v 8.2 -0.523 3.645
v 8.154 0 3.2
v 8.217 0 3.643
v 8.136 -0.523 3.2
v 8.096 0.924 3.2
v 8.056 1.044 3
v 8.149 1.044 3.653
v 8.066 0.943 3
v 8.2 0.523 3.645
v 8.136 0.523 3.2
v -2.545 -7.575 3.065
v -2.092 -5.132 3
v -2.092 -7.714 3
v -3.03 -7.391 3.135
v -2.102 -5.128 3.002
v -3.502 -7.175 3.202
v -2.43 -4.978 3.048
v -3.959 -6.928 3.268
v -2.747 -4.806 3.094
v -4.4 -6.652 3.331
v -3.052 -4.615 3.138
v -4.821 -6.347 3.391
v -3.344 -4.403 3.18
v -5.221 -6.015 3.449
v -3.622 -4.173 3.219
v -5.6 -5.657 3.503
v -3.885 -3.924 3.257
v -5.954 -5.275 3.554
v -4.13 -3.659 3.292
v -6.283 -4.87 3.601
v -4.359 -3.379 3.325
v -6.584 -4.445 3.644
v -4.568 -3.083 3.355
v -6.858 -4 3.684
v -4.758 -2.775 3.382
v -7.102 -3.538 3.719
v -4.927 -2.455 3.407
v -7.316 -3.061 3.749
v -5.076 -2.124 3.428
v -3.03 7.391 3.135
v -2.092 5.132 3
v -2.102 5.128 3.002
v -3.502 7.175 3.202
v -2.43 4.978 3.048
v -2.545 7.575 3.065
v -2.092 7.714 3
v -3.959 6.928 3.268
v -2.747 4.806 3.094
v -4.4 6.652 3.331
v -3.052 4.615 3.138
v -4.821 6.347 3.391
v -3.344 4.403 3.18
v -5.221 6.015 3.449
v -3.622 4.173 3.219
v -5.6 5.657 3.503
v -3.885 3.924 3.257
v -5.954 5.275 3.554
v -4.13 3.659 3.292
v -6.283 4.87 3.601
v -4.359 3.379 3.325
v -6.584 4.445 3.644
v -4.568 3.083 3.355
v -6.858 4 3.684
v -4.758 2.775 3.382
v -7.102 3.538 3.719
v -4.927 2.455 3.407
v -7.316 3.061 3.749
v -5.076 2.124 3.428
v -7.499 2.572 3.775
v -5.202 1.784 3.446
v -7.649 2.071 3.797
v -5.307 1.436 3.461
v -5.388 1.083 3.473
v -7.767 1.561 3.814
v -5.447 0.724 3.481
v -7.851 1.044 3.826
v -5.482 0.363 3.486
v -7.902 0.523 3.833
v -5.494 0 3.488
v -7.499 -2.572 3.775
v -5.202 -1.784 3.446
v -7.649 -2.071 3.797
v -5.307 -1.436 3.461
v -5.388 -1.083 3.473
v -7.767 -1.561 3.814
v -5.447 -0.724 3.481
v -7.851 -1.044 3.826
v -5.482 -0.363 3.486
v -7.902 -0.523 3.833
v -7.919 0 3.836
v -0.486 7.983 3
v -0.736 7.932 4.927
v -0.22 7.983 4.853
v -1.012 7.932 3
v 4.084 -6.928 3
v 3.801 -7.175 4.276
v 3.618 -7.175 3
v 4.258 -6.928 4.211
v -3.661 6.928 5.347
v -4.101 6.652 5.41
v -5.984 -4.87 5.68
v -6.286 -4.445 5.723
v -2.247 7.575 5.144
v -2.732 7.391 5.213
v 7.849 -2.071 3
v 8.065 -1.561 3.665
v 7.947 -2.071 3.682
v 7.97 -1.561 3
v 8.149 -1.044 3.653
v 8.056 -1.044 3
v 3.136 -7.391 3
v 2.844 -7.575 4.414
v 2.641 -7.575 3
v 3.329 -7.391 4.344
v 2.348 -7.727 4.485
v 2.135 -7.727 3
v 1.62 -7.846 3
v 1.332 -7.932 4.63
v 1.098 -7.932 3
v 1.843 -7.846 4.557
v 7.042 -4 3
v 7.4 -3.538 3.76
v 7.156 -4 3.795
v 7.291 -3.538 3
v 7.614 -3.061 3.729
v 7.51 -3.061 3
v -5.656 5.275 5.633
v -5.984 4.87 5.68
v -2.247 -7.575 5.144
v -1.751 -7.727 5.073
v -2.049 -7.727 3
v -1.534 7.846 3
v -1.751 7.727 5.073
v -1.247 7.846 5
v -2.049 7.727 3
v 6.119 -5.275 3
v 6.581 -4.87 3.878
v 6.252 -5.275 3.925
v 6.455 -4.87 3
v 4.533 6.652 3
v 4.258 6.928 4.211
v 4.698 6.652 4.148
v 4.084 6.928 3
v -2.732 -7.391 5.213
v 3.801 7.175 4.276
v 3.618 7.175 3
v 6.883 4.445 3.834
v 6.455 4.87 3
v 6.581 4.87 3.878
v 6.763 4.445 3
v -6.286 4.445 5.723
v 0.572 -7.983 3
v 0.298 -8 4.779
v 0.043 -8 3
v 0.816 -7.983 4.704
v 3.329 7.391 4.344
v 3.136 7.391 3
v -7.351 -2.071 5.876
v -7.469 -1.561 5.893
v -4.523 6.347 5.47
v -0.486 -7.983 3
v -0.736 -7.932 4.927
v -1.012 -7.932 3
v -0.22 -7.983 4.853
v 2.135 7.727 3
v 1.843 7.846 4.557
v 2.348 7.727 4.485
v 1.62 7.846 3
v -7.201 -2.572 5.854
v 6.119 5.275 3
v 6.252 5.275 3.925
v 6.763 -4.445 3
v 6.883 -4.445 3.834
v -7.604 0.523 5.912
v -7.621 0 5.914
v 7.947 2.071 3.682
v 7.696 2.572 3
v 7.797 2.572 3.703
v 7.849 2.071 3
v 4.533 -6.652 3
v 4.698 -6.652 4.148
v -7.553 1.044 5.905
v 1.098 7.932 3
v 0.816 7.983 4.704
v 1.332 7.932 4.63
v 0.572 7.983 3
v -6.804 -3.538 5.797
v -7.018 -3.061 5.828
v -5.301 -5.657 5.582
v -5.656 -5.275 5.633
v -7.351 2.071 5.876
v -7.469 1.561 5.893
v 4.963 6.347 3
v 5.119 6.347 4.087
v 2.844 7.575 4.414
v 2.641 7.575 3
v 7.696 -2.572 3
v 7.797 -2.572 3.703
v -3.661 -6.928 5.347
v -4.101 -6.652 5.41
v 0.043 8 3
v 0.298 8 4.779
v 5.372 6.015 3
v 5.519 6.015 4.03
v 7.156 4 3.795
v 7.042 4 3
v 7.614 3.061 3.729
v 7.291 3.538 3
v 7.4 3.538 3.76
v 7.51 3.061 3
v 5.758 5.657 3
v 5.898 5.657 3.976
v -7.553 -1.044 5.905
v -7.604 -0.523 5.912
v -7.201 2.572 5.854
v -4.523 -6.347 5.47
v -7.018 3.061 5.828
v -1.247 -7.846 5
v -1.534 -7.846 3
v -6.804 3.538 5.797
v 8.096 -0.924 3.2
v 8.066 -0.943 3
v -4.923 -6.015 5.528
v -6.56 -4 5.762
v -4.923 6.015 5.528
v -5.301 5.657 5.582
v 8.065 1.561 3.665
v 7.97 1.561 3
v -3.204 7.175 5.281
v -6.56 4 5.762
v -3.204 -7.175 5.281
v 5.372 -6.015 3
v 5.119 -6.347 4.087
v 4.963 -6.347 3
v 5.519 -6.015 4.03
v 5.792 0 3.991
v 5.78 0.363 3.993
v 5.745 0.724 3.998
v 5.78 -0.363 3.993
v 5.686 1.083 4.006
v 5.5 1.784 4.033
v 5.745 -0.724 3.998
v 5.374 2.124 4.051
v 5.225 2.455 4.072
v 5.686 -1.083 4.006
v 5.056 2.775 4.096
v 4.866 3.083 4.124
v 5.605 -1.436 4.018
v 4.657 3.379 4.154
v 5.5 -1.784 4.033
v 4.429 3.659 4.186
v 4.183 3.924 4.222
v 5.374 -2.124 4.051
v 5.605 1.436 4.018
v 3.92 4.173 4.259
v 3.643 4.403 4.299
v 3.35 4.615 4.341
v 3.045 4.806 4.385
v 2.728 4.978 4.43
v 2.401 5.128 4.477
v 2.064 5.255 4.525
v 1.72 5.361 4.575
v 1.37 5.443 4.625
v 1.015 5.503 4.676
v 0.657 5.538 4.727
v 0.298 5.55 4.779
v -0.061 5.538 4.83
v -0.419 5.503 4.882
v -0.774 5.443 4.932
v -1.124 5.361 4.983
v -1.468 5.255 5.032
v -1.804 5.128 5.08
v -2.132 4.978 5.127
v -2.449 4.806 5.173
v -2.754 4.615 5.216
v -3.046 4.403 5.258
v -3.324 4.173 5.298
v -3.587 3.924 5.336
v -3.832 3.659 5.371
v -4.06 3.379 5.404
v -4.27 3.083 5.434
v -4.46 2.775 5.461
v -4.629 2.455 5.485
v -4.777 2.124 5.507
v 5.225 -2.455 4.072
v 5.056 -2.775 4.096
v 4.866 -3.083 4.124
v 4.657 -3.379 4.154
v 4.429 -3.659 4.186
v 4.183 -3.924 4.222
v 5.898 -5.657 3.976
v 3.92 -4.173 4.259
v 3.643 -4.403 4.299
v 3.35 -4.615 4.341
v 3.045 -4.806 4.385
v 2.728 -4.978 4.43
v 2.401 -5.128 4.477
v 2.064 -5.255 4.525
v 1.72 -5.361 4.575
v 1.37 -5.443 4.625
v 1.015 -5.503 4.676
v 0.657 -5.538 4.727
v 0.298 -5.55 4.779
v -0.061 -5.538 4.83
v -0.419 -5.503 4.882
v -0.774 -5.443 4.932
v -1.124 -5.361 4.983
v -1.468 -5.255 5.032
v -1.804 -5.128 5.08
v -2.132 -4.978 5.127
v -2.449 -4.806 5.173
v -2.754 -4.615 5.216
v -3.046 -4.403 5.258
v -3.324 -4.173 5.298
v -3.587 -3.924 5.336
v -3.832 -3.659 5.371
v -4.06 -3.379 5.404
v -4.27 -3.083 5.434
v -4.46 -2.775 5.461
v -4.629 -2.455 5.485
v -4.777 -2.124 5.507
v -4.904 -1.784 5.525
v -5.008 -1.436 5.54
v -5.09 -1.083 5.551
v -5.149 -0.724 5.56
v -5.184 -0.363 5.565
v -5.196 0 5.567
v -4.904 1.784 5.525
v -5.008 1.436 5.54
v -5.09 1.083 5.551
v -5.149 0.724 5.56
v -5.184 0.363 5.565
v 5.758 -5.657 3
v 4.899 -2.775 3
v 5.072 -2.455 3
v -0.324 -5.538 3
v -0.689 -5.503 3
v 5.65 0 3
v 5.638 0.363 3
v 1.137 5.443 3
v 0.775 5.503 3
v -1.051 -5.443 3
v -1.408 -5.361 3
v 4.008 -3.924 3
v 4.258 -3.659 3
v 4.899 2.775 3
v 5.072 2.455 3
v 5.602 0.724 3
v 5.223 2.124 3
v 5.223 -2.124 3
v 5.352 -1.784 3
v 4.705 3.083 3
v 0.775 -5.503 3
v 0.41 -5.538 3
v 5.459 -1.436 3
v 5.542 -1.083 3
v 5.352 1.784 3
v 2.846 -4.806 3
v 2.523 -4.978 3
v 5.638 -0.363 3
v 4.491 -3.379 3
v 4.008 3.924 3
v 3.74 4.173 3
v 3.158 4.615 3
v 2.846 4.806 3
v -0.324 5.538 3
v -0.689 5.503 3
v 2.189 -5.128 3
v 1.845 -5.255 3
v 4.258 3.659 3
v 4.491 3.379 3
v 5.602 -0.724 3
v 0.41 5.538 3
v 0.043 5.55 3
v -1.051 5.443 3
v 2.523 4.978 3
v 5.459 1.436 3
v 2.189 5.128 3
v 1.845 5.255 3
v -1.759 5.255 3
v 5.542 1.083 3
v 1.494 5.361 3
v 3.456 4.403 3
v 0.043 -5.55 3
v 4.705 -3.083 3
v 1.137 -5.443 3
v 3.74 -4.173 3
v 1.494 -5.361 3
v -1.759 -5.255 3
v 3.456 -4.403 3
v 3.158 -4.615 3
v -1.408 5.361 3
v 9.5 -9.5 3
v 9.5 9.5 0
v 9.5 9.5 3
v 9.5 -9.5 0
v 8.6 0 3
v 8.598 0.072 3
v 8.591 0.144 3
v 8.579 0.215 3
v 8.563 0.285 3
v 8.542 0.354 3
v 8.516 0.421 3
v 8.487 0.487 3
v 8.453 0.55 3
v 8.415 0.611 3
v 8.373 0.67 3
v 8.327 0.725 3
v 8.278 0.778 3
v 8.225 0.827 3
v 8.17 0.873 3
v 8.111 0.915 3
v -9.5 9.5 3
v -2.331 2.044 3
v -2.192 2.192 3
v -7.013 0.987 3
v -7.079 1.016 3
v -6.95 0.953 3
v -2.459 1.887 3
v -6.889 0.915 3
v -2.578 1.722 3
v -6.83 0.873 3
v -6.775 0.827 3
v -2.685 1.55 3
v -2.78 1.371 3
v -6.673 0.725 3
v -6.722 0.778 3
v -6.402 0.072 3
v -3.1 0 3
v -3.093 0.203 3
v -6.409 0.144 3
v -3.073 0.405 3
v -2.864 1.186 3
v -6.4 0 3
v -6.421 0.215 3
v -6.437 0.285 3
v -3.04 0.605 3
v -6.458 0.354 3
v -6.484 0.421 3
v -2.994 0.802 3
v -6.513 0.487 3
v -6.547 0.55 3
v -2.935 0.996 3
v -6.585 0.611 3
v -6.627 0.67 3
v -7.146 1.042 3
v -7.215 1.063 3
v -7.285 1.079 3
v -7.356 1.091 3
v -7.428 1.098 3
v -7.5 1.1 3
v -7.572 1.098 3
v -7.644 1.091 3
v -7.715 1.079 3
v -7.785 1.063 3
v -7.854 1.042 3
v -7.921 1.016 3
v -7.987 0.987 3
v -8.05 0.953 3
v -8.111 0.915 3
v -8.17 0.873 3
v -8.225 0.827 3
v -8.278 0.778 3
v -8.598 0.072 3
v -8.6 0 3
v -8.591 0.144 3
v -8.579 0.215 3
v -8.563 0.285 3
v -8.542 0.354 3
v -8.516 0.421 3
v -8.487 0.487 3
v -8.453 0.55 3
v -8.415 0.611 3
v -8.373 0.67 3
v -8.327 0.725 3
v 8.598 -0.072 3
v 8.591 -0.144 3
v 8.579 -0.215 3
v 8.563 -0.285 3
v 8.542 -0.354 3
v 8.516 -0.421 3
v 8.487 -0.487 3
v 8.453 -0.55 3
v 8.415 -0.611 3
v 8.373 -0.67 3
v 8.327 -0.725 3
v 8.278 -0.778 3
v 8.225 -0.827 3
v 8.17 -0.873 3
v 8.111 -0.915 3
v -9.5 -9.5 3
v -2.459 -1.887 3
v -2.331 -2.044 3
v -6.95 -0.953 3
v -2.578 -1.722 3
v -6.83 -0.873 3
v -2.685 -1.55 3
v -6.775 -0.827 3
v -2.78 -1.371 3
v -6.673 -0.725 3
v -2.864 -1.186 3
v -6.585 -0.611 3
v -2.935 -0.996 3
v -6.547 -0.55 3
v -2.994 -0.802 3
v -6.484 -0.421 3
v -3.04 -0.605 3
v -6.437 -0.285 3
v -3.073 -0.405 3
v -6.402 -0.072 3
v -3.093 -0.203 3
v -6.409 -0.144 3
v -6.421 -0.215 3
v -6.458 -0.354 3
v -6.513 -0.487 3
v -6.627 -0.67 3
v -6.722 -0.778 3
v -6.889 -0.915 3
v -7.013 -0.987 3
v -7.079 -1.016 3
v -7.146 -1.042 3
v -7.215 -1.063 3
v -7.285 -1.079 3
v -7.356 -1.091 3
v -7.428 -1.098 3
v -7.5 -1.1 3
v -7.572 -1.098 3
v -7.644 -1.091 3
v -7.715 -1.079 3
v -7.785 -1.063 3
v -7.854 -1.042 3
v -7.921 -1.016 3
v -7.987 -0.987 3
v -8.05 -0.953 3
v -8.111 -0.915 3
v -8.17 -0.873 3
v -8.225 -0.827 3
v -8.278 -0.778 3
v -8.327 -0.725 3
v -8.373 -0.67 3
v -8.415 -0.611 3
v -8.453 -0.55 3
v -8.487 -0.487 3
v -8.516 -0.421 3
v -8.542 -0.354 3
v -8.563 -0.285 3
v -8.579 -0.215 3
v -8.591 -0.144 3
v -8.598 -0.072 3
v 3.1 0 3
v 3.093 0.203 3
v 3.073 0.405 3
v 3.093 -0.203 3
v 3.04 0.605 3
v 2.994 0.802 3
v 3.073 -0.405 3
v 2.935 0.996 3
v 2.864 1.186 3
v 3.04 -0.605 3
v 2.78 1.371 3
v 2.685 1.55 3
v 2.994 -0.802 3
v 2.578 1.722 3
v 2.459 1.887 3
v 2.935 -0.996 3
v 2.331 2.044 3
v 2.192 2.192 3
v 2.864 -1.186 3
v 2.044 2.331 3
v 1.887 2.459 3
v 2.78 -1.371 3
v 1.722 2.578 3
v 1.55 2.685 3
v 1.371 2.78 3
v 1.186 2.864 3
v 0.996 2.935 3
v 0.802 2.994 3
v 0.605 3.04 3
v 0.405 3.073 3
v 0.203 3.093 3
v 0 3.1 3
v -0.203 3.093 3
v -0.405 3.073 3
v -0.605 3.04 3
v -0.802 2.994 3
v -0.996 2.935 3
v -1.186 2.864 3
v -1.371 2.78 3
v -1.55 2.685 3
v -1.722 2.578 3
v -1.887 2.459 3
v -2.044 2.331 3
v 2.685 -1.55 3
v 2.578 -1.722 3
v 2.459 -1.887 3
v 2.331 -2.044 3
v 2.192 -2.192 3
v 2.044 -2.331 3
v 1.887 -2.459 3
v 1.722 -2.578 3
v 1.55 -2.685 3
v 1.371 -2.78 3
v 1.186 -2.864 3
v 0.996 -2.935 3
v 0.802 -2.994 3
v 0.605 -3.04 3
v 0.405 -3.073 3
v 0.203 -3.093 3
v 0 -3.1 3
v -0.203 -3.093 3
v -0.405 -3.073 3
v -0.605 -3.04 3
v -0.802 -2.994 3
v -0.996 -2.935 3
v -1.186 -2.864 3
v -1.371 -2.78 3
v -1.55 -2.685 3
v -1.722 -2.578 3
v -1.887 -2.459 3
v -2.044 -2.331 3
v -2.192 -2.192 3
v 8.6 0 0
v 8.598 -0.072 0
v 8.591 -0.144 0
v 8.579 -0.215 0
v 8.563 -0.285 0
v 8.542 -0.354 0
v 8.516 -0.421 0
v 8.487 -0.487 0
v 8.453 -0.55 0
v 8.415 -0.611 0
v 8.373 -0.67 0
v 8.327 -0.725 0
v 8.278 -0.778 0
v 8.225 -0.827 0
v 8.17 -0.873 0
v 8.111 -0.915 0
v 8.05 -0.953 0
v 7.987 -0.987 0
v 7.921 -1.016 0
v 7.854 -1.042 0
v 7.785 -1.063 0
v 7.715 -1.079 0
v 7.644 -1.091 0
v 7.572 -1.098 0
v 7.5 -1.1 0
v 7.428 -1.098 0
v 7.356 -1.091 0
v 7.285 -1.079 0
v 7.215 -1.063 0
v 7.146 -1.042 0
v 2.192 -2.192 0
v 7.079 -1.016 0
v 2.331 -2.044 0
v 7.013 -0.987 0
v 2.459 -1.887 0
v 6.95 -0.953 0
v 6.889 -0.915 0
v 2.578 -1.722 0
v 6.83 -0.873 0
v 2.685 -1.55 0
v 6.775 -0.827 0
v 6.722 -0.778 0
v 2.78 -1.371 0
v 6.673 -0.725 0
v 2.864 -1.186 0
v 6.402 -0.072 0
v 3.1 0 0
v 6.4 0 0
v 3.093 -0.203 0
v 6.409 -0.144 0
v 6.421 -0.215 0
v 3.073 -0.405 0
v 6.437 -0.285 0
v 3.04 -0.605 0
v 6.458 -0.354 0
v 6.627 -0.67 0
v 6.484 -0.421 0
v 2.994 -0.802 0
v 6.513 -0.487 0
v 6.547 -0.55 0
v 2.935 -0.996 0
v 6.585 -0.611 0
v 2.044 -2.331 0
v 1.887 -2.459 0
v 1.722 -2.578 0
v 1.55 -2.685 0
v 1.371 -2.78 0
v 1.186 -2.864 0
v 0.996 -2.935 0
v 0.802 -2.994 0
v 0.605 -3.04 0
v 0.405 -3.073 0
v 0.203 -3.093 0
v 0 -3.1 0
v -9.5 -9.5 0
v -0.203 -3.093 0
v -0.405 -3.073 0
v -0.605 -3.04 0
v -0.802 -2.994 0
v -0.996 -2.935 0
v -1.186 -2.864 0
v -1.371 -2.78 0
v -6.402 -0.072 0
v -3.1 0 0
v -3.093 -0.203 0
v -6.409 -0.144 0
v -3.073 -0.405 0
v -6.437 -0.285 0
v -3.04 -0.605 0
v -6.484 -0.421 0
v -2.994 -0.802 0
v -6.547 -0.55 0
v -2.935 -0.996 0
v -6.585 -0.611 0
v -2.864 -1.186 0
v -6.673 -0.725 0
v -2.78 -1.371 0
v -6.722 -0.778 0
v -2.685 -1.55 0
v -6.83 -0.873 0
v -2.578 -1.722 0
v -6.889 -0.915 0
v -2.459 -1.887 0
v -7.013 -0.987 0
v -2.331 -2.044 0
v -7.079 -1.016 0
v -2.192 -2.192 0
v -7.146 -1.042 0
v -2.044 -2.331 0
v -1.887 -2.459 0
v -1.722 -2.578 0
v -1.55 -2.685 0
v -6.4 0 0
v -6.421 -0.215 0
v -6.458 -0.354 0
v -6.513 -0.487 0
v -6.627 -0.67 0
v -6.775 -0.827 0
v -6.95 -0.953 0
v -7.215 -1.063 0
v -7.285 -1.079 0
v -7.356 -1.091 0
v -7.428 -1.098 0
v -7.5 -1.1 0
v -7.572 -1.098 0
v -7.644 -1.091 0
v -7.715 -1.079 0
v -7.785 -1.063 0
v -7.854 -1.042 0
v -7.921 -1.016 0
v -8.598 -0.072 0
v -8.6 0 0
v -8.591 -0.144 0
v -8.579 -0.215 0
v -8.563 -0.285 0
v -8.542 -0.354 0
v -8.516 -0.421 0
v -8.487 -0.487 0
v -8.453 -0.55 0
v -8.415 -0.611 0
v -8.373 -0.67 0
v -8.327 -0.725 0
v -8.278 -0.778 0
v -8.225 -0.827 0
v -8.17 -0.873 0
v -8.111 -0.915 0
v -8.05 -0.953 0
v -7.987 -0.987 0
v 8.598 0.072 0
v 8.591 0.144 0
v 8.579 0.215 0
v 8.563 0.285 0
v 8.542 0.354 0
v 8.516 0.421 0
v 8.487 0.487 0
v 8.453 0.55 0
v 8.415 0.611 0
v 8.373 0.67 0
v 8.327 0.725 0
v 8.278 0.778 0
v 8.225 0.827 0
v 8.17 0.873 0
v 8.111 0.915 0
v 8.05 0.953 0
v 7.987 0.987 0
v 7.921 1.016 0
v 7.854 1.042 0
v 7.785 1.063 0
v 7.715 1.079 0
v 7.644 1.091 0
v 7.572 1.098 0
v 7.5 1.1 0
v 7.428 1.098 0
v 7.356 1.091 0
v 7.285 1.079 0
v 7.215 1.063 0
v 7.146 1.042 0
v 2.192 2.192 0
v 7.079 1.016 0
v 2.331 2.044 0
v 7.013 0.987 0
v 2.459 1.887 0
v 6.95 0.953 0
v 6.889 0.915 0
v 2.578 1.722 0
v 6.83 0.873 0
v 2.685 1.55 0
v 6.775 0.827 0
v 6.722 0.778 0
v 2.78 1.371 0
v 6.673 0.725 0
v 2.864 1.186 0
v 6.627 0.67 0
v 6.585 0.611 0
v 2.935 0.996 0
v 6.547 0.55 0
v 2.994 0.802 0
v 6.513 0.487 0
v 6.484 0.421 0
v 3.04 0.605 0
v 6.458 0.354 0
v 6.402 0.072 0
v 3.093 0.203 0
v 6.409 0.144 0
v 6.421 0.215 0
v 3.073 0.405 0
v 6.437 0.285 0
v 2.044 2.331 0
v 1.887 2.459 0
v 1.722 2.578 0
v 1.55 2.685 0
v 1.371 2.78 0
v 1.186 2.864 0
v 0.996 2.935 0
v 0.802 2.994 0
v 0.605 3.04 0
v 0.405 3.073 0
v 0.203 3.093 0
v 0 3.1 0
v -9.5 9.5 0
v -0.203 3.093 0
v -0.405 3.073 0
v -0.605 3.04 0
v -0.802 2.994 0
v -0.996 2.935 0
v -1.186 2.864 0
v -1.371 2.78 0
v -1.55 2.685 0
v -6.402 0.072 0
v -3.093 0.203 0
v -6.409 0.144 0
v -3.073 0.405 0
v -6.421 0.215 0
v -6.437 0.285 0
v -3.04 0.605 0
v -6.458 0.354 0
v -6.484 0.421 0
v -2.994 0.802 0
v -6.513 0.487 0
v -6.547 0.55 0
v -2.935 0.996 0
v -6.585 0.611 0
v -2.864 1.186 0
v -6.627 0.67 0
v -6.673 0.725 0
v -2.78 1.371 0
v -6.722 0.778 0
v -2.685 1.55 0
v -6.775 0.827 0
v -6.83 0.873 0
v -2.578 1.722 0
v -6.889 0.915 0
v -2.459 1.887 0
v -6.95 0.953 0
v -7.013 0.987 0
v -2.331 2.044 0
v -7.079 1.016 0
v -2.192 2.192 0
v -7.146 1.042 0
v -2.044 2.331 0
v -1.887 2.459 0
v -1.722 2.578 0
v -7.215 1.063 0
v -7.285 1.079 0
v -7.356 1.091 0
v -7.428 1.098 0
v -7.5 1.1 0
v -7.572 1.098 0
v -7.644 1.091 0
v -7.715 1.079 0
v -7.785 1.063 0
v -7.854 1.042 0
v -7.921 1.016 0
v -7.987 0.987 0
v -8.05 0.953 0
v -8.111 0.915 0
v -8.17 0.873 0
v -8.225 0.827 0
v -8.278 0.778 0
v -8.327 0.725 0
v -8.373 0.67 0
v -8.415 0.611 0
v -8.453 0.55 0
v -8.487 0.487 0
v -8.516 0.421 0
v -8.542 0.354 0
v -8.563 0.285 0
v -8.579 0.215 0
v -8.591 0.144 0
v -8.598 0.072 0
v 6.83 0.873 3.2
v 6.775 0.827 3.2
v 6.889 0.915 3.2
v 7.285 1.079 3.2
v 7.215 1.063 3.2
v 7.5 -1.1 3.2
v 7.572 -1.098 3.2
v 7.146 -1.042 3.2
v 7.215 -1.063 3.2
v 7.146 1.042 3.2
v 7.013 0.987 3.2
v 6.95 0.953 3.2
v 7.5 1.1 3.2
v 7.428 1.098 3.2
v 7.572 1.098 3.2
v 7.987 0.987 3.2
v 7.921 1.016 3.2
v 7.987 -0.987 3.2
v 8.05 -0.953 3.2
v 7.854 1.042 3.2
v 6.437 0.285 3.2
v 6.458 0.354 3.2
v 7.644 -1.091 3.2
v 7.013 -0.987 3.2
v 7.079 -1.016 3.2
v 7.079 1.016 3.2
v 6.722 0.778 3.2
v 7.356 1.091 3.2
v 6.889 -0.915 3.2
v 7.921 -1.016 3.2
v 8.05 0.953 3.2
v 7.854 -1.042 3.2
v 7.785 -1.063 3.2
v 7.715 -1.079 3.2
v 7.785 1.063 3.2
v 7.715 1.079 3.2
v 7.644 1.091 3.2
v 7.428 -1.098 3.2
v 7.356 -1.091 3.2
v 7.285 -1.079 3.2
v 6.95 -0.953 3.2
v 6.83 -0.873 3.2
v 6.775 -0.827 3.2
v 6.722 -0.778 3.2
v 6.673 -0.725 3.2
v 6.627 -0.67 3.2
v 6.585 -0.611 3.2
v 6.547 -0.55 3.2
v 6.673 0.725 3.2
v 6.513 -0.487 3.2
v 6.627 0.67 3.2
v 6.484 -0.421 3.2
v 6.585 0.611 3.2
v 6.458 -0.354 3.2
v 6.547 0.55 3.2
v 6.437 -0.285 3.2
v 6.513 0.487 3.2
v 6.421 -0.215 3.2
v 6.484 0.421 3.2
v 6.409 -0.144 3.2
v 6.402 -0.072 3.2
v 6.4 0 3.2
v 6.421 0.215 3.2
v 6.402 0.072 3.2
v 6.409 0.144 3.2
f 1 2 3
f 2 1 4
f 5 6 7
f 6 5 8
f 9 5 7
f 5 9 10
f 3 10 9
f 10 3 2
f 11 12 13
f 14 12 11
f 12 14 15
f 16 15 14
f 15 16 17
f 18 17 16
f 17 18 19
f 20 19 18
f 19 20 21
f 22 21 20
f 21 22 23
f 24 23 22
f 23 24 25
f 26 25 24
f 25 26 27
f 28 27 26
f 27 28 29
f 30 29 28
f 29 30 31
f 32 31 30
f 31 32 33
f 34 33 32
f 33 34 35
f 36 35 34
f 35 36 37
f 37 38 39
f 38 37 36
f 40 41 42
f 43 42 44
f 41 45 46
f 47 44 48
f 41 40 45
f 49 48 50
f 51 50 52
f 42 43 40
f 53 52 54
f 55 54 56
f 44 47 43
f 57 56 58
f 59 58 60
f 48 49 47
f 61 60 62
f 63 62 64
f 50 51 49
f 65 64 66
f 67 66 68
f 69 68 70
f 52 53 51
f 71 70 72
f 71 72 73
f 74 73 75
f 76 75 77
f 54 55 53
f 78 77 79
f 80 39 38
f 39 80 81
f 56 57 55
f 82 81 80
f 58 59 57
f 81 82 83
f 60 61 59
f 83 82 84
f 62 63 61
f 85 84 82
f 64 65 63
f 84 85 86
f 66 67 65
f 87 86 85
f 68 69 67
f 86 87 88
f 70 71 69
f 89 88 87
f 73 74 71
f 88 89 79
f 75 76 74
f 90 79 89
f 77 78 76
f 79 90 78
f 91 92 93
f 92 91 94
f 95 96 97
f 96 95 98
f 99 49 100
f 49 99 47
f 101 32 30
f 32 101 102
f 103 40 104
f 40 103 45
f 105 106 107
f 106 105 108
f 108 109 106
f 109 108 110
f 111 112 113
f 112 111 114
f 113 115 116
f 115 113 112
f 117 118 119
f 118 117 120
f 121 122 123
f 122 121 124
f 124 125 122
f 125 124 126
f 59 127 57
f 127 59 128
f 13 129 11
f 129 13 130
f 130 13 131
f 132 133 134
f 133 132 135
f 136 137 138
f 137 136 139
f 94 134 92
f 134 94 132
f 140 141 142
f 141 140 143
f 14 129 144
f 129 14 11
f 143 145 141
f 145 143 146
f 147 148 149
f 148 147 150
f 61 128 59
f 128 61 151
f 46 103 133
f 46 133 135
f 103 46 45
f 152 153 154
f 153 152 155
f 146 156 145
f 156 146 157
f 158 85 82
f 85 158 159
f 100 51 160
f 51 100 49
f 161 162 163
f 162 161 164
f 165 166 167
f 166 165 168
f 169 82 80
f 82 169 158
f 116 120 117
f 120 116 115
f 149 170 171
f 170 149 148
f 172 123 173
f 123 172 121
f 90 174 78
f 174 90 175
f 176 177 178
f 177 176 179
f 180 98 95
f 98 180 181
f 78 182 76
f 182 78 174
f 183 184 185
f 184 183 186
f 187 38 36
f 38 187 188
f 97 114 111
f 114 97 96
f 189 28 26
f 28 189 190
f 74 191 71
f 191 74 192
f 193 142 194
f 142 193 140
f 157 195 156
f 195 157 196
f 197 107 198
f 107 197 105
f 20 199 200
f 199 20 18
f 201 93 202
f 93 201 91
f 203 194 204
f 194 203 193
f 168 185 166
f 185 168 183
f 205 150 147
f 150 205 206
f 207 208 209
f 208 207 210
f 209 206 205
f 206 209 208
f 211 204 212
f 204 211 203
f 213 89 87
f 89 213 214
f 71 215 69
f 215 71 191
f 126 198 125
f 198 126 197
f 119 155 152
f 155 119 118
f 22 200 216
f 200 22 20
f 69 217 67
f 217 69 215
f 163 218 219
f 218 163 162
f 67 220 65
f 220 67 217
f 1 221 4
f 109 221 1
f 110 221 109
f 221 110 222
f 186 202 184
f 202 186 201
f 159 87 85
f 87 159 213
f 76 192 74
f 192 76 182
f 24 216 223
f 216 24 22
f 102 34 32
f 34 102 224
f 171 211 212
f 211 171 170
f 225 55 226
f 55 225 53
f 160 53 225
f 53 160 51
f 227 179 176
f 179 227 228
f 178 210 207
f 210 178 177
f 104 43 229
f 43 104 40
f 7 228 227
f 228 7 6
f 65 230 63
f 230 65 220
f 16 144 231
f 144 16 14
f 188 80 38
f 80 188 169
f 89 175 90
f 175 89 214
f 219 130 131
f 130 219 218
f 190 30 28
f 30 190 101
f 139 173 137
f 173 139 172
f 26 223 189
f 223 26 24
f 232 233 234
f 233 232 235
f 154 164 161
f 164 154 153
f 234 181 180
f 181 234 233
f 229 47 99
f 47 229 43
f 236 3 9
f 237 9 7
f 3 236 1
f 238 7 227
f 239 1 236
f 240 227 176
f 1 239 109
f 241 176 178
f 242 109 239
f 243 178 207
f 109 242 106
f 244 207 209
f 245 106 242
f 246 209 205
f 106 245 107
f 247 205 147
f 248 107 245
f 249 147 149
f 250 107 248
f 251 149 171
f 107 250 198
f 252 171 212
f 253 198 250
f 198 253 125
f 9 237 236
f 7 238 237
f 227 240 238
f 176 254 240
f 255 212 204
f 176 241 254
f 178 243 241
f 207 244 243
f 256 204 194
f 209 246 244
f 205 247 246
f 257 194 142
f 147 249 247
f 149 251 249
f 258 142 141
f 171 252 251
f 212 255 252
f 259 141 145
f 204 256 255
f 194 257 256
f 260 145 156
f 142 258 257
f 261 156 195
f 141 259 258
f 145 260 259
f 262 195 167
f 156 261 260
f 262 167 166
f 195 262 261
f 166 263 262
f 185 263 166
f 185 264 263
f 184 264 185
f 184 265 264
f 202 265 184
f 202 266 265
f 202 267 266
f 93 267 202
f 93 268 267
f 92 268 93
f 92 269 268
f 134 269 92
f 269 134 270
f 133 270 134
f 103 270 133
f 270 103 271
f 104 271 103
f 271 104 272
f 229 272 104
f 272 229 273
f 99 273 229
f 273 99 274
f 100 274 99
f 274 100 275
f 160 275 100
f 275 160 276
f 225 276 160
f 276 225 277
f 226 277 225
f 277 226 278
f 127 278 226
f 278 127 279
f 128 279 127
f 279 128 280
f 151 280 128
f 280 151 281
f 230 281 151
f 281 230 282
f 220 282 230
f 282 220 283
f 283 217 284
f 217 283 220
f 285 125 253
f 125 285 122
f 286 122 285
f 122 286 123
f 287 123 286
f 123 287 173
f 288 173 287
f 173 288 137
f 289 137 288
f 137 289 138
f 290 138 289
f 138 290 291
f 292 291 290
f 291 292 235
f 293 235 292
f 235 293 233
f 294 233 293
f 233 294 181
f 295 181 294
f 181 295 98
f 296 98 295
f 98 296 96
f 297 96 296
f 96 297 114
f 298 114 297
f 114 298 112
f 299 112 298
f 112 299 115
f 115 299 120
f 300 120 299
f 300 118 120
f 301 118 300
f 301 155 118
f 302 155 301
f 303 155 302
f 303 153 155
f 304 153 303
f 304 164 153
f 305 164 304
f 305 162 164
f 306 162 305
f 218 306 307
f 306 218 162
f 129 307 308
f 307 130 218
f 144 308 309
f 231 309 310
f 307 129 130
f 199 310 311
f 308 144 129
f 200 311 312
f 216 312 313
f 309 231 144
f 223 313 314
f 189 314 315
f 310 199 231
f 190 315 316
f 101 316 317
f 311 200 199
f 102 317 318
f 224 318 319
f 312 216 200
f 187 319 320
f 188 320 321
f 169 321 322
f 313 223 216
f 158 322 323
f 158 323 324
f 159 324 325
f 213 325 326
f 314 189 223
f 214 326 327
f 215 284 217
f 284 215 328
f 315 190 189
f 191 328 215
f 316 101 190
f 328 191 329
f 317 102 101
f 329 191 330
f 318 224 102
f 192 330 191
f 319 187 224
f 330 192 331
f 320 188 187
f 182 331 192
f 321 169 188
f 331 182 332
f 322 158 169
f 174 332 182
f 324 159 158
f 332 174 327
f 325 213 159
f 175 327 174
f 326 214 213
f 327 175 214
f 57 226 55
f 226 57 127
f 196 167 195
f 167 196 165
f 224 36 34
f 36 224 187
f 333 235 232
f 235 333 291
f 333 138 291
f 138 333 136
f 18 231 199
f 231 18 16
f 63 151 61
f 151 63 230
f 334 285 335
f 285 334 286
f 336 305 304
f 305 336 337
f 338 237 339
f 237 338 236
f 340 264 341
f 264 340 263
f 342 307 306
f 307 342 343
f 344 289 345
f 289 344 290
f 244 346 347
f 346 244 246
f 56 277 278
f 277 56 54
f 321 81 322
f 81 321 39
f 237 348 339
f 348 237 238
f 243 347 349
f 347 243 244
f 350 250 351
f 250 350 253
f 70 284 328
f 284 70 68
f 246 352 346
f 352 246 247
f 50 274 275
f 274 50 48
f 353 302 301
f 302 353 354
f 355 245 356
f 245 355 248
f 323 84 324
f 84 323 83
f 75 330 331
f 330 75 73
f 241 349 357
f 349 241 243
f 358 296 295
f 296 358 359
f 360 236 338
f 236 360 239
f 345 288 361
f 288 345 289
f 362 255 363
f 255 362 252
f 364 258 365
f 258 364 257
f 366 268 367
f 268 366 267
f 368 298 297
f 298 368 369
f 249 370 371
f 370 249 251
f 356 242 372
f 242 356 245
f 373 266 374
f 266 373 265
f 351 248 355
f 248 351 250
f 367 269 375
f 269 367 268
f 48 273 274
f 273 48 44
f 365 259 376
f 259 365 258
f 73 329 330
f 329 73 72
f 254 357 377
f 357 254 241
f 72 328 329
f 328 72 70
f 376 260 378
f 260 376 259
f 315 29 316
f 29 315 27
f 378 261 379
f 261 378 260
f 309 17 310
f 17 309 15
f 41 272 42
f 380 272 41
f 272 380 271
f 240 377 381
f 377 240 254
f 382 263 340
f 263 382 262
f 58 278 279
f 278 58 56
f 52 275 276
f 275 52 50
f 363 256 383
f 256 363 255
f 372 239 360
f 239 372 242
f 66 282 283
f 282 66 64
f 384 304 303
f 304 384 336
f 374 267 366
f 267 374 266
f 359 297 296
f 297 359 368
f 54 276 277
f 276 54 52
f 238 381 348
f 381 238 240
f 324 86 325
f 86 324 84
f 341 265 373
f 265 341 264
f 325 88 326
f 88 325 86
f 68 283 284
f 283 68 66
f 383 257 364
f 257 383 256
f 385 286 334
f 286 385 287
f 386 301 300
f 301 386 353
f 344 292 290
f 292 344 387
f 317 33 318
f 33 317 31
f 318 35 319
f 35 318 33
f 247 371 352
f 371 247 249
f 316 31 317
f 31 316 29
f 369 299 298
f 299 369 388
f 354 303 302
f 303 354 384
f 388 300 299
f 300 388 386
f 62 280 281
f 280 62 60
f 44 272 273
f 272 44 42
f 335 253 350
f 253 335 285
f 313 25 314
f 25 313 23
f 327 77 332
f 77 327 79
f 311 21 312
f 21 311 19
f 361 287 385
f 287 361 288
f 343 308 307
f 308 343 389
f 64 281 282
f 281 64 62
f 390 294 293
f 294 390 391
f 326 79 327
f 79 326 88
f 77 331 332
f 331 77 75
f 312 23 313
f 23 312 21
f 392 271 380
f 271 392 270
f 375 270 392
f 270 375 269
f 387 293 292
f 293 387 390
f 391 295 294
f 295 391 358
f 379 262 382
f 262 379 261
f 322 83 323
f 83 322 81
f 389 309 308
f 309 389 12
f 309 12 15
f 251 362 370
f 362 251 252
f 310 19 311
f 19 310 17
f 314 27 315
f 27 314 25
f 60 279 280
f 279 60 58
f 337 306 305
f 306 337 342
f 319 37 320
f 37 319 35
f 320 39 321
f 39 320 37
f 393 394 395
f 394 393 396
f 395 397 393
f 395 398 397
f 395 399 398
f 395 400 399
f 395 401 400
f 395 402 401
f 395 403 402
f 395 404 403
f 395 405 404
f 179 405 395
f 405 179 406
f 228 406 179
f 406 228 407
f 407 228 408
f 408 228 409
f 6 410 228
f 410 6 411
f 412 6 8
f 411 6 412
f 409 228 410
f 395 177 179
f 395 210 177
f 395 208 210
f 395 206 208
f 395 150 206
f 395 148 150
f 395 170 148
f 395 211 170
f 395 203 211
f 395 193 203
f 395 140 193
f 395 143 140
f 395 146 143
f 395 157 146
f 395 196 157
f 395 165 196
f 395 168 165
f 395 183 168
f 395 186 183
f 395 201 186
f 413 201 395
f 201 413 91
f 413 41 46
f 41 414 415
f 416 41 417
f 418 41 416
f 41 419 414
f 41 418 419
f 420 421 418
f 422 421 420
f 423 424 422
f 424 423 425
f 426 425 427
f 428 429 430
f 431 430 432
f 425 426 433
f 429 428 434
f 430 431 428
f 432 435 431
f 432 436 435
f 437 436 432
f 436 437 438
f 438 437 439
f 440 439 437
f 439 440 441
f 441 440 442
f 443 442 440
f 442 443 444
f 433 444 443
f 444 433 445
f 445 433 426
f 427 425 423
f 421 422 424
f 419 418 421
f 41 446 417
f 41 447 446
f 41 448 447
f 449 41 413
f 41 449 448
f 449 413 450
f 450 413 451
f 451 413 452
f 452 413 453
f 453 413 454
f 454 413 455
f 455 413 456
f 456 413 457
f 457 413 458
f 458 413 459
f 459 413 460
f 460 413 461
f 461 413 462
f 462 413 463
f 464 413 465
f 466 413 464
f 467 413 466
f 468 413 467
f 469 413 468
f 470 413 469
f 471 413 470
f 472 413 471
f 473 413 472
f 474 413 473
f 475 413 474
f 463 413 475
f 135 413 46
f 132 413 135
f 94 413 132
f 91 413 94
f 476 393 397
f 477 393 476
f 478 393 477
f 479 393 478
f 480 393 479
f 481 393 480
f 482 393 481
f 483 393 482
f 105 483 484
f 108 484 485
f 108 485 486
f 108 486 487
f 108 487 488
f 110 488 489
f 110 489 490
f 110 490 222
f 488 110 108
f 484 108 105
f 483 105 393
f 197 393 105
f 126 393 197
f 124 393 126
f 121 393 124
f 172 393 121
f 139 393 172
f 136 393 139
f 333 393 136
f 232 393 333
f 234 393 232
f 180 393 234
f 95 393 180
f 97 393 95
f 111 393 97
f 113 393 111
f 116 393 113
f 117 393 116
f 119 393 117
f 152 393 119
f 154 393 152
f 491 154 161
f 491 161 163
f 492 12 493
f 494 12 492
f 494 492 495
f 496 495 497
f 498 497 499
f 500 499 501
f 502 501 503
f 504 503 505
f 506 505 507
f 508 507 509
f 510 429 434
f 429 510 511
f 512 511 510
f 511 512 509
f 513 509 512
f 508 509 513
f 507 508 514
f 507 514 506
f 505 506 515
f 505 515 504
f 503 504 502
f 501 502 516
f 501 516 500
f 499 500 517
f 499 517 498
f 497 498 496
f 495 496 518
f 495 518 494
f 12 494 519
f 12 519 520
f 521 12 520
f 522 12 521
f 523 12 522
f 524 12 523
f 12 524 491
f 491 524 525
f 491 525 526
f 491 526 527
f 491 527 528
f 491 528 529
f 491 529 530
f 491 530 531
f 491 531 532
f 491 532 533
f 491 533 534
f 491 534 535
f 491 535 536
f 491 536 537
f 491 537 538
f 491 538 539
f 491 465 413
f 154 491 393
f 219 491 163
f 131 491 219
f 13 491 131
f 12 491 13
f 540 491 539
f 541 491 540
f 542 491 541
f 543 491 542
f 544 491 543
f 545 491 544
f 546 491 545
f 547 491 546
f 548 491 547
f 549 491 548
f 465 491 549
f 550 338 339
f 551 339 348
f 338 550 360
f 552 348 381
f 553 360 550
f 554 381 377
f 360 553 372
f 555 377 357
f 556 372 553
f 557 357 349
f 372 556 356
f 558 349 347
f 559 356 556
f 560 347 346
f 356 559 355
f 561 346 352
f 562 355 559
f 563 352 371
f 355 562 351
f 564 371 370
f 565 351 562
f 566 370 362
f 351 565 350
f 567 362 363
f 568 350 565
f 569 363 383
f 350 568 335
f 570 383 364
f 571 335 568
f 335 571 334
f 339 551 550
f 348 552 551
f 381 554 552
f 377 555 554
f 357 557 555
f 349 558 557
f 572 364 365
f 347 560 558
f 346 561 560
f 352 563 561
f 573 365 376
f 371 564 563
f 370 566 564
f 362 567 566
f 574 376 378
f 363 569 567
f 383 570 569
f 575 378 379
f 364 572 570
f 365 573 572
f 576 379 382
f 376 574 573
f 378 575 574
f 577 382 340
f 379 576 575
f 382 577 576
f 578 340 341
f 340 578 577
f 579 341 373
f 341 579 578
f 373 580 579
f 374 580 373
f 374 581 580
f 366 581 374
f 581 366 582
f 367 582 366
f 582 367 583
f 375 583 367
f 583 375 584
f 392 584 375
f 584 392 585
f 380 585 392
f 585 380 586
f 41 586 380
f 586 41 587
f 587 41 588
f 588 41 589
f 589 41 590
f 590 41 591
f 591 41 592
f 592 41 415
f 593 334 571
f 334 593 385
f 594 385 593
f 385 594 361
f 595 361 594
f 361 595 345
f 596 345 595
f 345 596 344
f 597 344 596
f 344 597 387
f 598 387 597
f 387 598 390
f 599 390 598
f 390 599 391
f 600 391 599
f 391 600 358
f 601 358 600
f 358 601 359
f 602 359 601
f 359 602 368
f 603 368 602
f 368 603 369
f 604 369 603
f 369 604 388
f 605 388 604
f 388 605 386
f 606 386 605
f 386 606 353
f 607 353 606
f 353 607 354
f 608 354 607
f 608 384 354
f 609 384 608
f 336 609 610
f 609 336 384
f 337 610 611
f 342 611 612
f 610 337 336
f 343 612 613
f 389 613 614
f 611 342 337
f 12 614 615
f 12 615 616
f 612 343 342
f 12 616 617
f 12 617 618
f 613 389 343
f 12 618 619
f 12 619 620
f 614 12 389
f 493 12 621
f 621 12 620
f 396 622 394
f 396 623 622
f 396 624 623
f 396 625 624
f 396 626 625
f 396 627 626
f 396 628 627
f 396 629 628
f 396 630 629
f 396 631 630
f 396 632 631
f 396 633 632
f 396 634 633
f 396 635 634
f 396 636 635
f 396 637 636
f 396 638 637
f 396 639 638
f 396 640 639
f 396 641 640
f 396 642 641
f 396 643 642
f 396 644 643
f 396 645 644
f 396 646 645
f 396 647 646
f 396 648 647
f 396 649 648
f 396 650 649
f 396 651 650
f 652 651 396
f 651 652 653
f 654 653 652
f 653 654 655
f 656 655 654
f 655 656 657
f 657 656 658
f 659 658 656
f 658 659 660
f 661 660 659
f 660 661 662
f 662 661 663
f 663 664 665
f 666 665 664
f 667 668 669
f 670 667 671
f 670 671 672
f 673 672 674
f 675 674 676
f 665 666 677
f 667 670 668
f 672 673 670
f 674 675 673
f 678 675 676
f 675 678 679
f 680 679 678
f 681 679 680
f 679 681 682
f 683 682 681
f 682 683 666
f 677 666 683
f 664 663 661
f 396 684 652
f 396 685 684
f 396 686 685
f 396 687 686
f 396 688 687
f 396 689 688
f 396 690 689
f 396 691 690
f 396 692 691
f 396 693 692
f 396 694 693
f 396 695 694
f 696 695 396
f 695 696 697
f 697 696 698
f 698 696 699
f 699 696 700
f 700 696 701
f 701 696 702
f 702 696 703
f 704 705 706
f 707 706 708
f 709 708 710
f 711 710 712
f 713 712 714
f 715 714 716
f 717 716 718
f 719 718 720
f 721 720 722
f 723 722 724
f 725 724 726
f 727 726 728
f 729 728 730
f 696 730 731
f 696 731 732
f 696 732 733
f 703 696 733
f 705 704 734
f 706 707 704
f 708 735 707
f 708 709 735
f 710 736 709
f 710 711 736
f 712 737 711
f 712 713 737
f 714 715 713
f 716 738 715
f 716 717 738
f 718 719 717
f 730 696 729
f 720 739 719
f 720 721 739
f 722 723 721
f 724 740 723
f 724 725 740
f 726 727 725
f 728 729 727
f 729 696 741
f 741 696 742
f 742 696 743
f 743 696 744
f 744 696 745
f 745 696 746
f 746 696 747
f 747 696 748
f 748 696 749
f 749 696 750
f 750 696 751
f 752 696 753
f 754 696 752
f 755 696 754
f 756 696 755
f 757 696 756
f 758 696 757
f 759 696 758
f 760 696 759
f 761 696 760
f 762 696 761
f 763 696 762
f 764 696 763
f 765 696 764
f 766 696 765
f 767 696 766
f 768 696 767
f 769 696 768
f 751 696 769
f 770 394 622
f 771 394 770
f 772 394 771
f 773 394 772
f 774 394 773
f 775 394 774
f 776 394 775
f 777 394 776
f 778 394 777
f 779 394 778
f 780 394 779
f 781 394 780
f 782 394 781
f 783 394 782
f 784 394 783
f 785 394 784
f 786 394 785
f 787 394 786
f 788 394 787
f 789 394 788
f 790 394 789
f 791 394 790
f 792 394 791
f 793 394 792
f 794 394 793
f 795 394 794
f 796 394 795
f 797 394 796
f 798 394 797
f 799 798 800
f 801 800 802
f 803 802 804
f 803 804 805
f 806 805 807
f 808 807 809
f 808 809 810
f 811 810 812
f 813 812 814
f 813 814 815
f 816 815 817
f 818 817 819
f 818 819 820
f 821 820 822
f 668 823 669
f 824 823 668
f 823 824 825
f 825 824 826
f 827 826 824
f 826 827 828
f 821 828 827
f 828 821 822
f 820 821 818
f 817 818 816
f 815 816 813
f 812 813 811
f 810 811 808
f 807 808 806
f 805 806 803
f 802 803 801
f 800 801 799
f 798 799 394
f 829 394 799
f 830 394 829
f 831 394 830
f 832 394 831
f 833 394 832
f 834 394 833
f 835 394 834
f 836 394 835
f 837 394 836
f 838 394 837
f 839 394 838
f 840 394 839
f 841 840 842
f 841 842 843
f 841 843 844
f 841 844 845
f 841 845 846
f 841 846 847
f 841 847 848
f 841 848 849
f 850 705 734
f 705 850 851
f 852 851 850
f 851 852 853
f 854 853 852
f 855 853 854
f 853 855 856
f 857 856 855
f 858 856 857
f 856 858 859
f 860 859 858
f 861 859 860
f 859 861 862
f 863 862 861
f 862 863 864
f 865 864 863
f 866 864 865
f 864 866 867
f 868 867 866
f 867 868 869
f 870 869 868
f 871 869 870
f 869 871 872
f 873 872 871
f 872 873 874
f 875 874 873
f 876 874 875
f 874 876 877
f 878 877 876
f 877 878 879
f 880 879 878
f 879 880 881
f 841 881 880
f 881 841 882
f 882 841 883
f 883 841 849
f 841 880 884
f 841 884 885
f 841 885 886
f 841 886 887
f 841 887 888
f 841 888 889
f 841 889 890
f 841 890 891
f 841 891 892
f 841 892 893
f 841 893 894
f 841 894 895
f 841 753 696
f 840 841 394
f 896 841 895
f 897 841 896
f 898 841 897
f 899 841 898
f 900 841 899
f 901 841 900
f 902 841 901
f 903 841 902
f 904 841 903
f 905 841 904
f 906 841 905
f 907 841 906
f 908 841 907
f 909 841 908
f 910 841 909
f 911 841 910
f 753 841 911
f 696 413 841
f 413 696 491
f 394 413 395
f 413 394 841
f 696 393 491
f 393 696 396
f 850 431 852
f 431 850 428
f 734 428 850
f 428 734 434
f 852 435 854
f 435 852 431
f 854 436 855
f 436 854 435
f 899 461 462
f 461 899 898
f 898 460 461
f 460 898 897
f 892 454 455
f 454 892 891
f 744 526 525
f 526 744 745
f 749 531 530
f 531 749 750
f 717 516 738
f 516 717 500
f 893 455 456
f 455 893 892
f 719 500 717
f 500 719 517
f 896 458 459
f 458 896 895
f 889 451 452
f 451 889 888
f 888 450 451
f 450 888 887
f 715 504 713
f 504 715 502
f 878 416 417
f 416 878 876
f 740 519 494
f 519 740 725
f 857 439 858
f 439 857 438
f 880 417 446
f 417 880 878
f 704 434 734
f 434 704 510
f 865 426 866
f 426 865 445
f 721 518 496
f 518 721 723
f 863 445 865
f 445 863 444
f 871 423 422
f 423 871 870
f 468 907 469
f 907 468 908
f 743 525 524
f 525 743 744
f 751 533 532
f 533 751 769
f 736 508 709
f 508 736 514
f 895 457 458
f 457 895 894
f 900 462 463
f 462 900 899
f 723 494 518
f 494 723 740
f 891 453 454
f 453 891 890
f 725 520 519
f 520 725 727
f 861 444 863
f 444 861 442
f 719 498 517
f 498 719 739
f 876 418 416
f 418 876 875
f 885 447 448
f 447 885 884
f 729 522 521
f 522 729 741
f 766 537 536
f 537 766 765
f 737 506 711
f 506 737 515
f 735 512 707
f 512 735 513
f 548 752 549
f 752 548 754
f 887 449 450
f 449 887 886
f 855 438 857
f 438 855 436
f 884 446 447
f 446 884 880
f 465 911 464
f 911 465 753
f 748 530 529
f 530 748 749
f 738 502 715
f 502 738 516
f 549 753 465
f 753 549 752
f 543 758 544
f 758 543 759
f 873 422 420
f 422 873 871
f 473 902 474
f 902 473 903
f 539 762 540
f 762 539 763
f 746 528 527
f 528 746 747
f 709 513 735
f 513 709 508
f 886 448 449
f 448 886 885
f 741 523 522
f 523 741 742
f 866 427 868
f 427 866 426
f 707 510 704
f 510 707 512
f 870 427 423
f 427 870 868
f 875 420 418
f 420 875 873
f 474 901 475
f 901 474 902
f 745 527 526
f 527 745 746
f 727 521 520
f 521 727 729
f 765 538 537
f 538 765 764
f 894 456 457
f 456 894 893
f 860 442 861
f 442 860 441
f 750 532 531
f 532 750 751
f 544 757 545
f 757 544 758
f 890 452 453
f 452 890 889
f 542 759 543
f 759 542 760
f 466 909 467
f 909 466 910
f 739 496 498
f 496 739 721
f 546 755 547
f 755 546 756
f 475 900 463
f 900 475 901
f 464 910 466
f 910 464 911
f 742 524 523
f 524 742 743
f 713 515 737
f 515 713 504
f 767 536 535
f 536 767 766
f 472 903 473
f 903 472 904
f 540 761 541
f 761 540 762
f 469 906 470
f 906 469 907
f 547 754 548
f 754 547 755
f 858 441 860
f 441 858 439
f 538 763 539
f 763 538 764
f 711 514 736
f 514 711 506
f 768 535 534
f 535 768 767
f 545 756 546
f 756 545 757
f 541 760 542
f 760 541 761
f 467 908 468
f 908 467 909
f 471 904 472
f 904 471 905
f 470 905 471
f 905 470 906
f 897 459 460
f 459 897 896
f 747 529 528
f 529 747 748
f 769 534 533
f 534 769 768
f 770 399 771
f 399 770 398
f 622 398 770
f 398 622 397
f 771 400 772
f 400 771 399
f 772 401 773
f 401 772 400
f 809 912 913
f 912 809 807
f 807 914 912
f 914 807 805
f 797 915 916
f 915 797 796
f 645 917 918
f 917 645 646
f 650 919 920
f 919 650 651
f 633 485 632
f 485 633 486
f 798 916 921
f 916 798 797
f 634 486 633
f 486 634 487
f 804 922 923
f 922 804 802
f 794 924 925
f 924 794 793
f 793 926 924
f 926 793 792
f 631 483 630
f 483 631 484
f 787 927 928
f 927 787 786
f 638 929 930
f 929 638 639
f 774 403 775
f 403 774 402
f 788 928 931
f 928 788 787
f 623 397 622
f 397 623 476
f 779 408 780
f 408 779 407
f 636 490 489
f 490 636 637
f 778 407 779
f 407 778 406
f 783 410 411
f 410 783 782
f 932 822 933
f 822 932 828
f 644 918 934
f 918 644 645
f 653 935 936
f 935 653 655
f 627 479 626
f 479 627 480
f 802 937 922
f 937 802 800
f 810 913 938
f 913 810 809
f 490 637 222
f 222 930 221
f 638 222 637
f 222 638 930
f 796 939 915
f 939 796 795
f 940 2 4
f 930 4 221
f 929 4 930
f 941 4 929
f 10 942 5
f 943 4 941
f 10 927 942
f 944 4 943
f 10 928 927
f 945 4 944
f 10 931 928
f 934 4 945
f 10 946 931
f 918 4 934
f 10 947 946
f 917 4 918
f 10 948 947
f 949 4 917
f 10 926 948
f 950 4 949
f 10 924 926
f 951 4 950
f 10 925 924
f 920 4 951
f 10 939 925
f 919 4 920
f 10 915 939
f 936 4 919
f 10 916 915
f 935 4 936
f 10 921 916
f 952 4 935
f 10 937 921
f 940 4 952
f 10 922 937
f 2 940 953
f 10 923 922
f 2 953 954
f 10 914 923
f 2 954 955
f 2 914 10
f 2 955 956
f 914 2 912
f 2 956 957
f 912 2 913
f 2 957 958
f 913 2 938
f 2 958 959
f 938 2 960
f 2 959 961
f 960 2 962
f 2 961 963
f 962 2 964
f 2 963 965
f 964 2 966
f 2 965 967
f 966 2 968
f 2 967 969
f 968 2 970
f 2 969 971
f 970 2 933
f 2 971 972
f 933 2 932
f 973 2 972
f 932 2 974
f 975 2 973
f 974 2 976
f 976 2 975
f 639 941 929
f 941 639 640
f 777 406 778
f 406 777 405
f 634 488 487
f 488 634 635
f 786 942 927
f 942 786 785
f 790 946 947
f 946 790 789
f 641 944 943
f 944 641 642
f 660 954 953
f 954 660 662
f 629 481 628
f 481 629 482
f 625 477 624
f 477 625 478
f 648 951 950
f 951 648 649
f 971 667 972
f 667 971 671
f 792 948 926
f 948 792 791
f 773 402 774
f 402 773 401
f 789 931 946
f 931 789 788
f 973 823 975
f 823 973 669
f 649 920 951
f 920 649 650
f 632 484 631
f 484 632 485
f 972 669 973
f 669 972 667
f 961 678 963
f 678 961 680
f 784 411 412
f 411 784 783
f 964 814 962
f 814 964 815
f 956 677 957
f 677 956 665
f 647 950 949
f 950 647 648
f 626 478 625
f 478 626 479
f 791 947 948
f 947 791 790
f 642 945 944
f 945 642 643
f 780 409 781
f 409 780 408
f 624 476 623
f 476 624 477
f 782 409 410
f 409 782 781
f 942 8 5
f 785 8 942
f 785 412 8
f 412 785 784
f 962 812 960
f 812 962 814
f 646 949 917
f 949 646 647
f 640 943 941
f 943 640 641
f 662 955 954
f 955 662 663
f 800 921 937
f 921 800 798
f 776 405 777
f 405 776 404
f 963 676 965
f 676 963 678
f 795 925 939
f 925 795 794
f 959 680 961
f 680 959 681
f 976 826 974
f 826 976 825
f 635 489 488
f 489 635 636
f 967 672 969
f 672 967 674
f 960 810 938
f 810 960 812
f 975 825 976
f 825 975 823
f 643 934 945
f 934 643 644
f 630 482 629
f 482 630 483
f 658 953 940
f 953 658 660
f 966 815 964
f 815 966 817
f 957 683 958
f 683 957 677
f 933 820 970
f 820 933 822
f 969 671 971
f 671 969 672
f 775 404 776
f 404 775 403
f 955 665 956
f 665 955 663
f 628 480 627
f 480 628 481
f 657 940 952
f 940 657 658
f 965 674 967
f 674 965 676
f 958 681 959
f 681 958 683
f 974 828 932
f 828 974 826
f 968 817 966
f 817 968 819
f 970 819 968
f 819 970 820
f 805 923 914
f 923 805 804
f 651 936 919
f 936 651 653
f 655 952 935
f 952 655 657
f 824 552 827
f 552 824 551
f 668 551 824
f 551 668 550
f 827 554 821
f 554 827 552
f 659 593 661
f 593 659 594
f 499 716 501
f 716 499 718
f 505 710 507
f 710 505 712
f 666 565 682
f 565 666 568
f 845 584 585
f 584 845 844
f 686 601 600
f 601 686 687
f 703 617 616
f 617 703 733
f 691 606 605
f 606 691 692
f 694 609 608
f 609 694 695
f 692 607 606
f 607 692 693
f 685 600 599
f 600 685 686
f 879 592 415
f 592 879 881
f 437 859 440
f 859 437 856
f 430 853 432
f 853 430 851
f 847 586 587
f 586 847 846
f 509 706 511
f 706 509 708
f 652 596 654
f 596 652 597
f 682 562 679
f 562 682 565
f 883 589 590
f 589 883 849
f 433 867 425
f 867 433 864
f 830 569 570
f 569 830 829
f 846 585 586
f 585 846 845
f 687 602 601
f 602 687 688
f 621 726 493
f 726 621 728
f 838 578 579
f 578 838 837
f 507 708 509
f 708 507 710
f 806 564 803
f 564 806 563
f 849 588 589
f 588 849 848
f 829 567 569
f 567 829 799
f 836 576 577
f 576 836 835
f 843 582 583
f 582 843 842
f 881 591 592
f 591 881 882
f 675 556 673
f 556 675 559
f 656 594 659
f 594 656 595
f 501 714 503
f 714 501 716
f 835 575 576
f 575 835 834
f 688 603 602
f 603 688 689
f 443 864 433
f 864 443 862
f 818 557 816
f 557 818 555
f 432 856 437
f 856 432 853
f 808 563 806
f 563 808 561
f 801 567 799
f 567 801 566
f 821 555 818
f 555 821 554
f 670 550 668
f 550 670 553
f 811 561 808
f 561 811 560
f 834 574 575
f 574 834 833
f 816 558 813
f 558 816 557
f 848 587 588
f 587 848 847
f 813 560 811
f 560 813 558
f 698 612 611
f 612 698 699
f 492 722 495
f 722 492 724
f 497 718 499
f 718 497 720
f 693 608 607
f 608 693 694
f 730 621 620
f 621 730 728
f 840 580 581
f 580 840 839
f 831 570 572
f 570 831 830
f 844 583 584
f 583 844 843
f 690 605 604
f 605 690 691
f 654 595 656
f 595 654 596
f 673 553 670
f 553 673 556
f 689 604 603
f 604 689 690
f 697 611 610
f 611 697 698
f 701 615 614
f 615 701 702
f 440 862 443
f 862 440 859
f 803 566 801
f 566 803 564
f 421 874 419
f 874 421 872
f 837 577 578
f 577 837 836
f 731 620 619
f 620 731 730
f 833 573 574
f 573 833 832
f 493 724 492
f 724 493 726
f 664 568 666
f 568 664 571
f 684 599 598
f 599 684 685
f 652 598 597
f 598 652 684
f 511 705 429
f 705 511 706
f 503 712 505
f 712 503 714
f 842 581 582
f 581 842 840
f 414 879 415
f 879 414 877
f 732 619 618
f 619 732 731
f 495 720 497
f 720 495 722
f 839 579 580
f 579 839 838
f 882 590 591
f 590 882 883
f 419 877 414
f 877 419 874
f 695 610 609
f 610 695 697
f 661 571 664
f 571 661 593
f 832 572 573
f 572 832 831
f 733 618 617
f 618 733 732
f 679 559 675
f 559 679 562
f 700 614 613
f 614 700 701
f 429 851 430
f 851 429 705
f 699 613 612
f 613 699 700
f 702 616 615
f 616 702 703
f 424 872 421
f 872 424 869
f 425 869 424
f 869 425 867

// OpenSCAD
// AE4901 8.16-degree replaceable tilted socket base, print 12 identical mounts.
// Mount local Z is CubeSat face normal, local X/Y define requested tilt azimuth.
// Reference optical axis: rotate XZ plane by azimuth around face normal.
// IMPORTANT: mounting assumes mask cap OD 10.7 mm; verify your print fit.
$fn=96;
tilt_deg=8.1615; // from +/-10deg rotation about spacecraft body diagonal
azimuth_deg=0;
base_side_mm=19;
base_thickness_mm=3;
socket_outer_radius_mm=8;
socket_inner_radius_mm=5.55; // 10.7 mm mask slips in with 0.4 mm diametral clearance
socket_length_mm=2.1; // holds cap collar; cap roof should protrude above socket for optical clearance
module tilted_socket(){
 difference(){
  cylinder(r=socket_outer_radius_mm,h=socket_length_mm);
  translate([0,0,-.1]) cylinder(r=socket_inner_radius_mm,h=socket_length_mm+.2);
 }
}
module mount(){
 difference(){
  union(){
   translate([-base_side_mm/2,-base_side_mm/2,0]) cube([base_side_mm,base_side_mm,base_thickness_mm]);
   translate([0,0,base_thickness_mm-.3]) rotate([0,0,azimuth_deg]) rotate([0,tilt_deg,0]) tilted_socket();
  }
  // central clearance for case leads and sensor body
  translate([0,0,-.2]) cylinder(r=3.1,h=base_thickness_mm+1);
  // optional two M2 base fixing holes, 15-mm spacing
  for(x=[-7.5,7.5]) translate([x,0,-.2]) cylinder(r=1.1,h=base_thickness_mm+.4);
 }
}
mount();
